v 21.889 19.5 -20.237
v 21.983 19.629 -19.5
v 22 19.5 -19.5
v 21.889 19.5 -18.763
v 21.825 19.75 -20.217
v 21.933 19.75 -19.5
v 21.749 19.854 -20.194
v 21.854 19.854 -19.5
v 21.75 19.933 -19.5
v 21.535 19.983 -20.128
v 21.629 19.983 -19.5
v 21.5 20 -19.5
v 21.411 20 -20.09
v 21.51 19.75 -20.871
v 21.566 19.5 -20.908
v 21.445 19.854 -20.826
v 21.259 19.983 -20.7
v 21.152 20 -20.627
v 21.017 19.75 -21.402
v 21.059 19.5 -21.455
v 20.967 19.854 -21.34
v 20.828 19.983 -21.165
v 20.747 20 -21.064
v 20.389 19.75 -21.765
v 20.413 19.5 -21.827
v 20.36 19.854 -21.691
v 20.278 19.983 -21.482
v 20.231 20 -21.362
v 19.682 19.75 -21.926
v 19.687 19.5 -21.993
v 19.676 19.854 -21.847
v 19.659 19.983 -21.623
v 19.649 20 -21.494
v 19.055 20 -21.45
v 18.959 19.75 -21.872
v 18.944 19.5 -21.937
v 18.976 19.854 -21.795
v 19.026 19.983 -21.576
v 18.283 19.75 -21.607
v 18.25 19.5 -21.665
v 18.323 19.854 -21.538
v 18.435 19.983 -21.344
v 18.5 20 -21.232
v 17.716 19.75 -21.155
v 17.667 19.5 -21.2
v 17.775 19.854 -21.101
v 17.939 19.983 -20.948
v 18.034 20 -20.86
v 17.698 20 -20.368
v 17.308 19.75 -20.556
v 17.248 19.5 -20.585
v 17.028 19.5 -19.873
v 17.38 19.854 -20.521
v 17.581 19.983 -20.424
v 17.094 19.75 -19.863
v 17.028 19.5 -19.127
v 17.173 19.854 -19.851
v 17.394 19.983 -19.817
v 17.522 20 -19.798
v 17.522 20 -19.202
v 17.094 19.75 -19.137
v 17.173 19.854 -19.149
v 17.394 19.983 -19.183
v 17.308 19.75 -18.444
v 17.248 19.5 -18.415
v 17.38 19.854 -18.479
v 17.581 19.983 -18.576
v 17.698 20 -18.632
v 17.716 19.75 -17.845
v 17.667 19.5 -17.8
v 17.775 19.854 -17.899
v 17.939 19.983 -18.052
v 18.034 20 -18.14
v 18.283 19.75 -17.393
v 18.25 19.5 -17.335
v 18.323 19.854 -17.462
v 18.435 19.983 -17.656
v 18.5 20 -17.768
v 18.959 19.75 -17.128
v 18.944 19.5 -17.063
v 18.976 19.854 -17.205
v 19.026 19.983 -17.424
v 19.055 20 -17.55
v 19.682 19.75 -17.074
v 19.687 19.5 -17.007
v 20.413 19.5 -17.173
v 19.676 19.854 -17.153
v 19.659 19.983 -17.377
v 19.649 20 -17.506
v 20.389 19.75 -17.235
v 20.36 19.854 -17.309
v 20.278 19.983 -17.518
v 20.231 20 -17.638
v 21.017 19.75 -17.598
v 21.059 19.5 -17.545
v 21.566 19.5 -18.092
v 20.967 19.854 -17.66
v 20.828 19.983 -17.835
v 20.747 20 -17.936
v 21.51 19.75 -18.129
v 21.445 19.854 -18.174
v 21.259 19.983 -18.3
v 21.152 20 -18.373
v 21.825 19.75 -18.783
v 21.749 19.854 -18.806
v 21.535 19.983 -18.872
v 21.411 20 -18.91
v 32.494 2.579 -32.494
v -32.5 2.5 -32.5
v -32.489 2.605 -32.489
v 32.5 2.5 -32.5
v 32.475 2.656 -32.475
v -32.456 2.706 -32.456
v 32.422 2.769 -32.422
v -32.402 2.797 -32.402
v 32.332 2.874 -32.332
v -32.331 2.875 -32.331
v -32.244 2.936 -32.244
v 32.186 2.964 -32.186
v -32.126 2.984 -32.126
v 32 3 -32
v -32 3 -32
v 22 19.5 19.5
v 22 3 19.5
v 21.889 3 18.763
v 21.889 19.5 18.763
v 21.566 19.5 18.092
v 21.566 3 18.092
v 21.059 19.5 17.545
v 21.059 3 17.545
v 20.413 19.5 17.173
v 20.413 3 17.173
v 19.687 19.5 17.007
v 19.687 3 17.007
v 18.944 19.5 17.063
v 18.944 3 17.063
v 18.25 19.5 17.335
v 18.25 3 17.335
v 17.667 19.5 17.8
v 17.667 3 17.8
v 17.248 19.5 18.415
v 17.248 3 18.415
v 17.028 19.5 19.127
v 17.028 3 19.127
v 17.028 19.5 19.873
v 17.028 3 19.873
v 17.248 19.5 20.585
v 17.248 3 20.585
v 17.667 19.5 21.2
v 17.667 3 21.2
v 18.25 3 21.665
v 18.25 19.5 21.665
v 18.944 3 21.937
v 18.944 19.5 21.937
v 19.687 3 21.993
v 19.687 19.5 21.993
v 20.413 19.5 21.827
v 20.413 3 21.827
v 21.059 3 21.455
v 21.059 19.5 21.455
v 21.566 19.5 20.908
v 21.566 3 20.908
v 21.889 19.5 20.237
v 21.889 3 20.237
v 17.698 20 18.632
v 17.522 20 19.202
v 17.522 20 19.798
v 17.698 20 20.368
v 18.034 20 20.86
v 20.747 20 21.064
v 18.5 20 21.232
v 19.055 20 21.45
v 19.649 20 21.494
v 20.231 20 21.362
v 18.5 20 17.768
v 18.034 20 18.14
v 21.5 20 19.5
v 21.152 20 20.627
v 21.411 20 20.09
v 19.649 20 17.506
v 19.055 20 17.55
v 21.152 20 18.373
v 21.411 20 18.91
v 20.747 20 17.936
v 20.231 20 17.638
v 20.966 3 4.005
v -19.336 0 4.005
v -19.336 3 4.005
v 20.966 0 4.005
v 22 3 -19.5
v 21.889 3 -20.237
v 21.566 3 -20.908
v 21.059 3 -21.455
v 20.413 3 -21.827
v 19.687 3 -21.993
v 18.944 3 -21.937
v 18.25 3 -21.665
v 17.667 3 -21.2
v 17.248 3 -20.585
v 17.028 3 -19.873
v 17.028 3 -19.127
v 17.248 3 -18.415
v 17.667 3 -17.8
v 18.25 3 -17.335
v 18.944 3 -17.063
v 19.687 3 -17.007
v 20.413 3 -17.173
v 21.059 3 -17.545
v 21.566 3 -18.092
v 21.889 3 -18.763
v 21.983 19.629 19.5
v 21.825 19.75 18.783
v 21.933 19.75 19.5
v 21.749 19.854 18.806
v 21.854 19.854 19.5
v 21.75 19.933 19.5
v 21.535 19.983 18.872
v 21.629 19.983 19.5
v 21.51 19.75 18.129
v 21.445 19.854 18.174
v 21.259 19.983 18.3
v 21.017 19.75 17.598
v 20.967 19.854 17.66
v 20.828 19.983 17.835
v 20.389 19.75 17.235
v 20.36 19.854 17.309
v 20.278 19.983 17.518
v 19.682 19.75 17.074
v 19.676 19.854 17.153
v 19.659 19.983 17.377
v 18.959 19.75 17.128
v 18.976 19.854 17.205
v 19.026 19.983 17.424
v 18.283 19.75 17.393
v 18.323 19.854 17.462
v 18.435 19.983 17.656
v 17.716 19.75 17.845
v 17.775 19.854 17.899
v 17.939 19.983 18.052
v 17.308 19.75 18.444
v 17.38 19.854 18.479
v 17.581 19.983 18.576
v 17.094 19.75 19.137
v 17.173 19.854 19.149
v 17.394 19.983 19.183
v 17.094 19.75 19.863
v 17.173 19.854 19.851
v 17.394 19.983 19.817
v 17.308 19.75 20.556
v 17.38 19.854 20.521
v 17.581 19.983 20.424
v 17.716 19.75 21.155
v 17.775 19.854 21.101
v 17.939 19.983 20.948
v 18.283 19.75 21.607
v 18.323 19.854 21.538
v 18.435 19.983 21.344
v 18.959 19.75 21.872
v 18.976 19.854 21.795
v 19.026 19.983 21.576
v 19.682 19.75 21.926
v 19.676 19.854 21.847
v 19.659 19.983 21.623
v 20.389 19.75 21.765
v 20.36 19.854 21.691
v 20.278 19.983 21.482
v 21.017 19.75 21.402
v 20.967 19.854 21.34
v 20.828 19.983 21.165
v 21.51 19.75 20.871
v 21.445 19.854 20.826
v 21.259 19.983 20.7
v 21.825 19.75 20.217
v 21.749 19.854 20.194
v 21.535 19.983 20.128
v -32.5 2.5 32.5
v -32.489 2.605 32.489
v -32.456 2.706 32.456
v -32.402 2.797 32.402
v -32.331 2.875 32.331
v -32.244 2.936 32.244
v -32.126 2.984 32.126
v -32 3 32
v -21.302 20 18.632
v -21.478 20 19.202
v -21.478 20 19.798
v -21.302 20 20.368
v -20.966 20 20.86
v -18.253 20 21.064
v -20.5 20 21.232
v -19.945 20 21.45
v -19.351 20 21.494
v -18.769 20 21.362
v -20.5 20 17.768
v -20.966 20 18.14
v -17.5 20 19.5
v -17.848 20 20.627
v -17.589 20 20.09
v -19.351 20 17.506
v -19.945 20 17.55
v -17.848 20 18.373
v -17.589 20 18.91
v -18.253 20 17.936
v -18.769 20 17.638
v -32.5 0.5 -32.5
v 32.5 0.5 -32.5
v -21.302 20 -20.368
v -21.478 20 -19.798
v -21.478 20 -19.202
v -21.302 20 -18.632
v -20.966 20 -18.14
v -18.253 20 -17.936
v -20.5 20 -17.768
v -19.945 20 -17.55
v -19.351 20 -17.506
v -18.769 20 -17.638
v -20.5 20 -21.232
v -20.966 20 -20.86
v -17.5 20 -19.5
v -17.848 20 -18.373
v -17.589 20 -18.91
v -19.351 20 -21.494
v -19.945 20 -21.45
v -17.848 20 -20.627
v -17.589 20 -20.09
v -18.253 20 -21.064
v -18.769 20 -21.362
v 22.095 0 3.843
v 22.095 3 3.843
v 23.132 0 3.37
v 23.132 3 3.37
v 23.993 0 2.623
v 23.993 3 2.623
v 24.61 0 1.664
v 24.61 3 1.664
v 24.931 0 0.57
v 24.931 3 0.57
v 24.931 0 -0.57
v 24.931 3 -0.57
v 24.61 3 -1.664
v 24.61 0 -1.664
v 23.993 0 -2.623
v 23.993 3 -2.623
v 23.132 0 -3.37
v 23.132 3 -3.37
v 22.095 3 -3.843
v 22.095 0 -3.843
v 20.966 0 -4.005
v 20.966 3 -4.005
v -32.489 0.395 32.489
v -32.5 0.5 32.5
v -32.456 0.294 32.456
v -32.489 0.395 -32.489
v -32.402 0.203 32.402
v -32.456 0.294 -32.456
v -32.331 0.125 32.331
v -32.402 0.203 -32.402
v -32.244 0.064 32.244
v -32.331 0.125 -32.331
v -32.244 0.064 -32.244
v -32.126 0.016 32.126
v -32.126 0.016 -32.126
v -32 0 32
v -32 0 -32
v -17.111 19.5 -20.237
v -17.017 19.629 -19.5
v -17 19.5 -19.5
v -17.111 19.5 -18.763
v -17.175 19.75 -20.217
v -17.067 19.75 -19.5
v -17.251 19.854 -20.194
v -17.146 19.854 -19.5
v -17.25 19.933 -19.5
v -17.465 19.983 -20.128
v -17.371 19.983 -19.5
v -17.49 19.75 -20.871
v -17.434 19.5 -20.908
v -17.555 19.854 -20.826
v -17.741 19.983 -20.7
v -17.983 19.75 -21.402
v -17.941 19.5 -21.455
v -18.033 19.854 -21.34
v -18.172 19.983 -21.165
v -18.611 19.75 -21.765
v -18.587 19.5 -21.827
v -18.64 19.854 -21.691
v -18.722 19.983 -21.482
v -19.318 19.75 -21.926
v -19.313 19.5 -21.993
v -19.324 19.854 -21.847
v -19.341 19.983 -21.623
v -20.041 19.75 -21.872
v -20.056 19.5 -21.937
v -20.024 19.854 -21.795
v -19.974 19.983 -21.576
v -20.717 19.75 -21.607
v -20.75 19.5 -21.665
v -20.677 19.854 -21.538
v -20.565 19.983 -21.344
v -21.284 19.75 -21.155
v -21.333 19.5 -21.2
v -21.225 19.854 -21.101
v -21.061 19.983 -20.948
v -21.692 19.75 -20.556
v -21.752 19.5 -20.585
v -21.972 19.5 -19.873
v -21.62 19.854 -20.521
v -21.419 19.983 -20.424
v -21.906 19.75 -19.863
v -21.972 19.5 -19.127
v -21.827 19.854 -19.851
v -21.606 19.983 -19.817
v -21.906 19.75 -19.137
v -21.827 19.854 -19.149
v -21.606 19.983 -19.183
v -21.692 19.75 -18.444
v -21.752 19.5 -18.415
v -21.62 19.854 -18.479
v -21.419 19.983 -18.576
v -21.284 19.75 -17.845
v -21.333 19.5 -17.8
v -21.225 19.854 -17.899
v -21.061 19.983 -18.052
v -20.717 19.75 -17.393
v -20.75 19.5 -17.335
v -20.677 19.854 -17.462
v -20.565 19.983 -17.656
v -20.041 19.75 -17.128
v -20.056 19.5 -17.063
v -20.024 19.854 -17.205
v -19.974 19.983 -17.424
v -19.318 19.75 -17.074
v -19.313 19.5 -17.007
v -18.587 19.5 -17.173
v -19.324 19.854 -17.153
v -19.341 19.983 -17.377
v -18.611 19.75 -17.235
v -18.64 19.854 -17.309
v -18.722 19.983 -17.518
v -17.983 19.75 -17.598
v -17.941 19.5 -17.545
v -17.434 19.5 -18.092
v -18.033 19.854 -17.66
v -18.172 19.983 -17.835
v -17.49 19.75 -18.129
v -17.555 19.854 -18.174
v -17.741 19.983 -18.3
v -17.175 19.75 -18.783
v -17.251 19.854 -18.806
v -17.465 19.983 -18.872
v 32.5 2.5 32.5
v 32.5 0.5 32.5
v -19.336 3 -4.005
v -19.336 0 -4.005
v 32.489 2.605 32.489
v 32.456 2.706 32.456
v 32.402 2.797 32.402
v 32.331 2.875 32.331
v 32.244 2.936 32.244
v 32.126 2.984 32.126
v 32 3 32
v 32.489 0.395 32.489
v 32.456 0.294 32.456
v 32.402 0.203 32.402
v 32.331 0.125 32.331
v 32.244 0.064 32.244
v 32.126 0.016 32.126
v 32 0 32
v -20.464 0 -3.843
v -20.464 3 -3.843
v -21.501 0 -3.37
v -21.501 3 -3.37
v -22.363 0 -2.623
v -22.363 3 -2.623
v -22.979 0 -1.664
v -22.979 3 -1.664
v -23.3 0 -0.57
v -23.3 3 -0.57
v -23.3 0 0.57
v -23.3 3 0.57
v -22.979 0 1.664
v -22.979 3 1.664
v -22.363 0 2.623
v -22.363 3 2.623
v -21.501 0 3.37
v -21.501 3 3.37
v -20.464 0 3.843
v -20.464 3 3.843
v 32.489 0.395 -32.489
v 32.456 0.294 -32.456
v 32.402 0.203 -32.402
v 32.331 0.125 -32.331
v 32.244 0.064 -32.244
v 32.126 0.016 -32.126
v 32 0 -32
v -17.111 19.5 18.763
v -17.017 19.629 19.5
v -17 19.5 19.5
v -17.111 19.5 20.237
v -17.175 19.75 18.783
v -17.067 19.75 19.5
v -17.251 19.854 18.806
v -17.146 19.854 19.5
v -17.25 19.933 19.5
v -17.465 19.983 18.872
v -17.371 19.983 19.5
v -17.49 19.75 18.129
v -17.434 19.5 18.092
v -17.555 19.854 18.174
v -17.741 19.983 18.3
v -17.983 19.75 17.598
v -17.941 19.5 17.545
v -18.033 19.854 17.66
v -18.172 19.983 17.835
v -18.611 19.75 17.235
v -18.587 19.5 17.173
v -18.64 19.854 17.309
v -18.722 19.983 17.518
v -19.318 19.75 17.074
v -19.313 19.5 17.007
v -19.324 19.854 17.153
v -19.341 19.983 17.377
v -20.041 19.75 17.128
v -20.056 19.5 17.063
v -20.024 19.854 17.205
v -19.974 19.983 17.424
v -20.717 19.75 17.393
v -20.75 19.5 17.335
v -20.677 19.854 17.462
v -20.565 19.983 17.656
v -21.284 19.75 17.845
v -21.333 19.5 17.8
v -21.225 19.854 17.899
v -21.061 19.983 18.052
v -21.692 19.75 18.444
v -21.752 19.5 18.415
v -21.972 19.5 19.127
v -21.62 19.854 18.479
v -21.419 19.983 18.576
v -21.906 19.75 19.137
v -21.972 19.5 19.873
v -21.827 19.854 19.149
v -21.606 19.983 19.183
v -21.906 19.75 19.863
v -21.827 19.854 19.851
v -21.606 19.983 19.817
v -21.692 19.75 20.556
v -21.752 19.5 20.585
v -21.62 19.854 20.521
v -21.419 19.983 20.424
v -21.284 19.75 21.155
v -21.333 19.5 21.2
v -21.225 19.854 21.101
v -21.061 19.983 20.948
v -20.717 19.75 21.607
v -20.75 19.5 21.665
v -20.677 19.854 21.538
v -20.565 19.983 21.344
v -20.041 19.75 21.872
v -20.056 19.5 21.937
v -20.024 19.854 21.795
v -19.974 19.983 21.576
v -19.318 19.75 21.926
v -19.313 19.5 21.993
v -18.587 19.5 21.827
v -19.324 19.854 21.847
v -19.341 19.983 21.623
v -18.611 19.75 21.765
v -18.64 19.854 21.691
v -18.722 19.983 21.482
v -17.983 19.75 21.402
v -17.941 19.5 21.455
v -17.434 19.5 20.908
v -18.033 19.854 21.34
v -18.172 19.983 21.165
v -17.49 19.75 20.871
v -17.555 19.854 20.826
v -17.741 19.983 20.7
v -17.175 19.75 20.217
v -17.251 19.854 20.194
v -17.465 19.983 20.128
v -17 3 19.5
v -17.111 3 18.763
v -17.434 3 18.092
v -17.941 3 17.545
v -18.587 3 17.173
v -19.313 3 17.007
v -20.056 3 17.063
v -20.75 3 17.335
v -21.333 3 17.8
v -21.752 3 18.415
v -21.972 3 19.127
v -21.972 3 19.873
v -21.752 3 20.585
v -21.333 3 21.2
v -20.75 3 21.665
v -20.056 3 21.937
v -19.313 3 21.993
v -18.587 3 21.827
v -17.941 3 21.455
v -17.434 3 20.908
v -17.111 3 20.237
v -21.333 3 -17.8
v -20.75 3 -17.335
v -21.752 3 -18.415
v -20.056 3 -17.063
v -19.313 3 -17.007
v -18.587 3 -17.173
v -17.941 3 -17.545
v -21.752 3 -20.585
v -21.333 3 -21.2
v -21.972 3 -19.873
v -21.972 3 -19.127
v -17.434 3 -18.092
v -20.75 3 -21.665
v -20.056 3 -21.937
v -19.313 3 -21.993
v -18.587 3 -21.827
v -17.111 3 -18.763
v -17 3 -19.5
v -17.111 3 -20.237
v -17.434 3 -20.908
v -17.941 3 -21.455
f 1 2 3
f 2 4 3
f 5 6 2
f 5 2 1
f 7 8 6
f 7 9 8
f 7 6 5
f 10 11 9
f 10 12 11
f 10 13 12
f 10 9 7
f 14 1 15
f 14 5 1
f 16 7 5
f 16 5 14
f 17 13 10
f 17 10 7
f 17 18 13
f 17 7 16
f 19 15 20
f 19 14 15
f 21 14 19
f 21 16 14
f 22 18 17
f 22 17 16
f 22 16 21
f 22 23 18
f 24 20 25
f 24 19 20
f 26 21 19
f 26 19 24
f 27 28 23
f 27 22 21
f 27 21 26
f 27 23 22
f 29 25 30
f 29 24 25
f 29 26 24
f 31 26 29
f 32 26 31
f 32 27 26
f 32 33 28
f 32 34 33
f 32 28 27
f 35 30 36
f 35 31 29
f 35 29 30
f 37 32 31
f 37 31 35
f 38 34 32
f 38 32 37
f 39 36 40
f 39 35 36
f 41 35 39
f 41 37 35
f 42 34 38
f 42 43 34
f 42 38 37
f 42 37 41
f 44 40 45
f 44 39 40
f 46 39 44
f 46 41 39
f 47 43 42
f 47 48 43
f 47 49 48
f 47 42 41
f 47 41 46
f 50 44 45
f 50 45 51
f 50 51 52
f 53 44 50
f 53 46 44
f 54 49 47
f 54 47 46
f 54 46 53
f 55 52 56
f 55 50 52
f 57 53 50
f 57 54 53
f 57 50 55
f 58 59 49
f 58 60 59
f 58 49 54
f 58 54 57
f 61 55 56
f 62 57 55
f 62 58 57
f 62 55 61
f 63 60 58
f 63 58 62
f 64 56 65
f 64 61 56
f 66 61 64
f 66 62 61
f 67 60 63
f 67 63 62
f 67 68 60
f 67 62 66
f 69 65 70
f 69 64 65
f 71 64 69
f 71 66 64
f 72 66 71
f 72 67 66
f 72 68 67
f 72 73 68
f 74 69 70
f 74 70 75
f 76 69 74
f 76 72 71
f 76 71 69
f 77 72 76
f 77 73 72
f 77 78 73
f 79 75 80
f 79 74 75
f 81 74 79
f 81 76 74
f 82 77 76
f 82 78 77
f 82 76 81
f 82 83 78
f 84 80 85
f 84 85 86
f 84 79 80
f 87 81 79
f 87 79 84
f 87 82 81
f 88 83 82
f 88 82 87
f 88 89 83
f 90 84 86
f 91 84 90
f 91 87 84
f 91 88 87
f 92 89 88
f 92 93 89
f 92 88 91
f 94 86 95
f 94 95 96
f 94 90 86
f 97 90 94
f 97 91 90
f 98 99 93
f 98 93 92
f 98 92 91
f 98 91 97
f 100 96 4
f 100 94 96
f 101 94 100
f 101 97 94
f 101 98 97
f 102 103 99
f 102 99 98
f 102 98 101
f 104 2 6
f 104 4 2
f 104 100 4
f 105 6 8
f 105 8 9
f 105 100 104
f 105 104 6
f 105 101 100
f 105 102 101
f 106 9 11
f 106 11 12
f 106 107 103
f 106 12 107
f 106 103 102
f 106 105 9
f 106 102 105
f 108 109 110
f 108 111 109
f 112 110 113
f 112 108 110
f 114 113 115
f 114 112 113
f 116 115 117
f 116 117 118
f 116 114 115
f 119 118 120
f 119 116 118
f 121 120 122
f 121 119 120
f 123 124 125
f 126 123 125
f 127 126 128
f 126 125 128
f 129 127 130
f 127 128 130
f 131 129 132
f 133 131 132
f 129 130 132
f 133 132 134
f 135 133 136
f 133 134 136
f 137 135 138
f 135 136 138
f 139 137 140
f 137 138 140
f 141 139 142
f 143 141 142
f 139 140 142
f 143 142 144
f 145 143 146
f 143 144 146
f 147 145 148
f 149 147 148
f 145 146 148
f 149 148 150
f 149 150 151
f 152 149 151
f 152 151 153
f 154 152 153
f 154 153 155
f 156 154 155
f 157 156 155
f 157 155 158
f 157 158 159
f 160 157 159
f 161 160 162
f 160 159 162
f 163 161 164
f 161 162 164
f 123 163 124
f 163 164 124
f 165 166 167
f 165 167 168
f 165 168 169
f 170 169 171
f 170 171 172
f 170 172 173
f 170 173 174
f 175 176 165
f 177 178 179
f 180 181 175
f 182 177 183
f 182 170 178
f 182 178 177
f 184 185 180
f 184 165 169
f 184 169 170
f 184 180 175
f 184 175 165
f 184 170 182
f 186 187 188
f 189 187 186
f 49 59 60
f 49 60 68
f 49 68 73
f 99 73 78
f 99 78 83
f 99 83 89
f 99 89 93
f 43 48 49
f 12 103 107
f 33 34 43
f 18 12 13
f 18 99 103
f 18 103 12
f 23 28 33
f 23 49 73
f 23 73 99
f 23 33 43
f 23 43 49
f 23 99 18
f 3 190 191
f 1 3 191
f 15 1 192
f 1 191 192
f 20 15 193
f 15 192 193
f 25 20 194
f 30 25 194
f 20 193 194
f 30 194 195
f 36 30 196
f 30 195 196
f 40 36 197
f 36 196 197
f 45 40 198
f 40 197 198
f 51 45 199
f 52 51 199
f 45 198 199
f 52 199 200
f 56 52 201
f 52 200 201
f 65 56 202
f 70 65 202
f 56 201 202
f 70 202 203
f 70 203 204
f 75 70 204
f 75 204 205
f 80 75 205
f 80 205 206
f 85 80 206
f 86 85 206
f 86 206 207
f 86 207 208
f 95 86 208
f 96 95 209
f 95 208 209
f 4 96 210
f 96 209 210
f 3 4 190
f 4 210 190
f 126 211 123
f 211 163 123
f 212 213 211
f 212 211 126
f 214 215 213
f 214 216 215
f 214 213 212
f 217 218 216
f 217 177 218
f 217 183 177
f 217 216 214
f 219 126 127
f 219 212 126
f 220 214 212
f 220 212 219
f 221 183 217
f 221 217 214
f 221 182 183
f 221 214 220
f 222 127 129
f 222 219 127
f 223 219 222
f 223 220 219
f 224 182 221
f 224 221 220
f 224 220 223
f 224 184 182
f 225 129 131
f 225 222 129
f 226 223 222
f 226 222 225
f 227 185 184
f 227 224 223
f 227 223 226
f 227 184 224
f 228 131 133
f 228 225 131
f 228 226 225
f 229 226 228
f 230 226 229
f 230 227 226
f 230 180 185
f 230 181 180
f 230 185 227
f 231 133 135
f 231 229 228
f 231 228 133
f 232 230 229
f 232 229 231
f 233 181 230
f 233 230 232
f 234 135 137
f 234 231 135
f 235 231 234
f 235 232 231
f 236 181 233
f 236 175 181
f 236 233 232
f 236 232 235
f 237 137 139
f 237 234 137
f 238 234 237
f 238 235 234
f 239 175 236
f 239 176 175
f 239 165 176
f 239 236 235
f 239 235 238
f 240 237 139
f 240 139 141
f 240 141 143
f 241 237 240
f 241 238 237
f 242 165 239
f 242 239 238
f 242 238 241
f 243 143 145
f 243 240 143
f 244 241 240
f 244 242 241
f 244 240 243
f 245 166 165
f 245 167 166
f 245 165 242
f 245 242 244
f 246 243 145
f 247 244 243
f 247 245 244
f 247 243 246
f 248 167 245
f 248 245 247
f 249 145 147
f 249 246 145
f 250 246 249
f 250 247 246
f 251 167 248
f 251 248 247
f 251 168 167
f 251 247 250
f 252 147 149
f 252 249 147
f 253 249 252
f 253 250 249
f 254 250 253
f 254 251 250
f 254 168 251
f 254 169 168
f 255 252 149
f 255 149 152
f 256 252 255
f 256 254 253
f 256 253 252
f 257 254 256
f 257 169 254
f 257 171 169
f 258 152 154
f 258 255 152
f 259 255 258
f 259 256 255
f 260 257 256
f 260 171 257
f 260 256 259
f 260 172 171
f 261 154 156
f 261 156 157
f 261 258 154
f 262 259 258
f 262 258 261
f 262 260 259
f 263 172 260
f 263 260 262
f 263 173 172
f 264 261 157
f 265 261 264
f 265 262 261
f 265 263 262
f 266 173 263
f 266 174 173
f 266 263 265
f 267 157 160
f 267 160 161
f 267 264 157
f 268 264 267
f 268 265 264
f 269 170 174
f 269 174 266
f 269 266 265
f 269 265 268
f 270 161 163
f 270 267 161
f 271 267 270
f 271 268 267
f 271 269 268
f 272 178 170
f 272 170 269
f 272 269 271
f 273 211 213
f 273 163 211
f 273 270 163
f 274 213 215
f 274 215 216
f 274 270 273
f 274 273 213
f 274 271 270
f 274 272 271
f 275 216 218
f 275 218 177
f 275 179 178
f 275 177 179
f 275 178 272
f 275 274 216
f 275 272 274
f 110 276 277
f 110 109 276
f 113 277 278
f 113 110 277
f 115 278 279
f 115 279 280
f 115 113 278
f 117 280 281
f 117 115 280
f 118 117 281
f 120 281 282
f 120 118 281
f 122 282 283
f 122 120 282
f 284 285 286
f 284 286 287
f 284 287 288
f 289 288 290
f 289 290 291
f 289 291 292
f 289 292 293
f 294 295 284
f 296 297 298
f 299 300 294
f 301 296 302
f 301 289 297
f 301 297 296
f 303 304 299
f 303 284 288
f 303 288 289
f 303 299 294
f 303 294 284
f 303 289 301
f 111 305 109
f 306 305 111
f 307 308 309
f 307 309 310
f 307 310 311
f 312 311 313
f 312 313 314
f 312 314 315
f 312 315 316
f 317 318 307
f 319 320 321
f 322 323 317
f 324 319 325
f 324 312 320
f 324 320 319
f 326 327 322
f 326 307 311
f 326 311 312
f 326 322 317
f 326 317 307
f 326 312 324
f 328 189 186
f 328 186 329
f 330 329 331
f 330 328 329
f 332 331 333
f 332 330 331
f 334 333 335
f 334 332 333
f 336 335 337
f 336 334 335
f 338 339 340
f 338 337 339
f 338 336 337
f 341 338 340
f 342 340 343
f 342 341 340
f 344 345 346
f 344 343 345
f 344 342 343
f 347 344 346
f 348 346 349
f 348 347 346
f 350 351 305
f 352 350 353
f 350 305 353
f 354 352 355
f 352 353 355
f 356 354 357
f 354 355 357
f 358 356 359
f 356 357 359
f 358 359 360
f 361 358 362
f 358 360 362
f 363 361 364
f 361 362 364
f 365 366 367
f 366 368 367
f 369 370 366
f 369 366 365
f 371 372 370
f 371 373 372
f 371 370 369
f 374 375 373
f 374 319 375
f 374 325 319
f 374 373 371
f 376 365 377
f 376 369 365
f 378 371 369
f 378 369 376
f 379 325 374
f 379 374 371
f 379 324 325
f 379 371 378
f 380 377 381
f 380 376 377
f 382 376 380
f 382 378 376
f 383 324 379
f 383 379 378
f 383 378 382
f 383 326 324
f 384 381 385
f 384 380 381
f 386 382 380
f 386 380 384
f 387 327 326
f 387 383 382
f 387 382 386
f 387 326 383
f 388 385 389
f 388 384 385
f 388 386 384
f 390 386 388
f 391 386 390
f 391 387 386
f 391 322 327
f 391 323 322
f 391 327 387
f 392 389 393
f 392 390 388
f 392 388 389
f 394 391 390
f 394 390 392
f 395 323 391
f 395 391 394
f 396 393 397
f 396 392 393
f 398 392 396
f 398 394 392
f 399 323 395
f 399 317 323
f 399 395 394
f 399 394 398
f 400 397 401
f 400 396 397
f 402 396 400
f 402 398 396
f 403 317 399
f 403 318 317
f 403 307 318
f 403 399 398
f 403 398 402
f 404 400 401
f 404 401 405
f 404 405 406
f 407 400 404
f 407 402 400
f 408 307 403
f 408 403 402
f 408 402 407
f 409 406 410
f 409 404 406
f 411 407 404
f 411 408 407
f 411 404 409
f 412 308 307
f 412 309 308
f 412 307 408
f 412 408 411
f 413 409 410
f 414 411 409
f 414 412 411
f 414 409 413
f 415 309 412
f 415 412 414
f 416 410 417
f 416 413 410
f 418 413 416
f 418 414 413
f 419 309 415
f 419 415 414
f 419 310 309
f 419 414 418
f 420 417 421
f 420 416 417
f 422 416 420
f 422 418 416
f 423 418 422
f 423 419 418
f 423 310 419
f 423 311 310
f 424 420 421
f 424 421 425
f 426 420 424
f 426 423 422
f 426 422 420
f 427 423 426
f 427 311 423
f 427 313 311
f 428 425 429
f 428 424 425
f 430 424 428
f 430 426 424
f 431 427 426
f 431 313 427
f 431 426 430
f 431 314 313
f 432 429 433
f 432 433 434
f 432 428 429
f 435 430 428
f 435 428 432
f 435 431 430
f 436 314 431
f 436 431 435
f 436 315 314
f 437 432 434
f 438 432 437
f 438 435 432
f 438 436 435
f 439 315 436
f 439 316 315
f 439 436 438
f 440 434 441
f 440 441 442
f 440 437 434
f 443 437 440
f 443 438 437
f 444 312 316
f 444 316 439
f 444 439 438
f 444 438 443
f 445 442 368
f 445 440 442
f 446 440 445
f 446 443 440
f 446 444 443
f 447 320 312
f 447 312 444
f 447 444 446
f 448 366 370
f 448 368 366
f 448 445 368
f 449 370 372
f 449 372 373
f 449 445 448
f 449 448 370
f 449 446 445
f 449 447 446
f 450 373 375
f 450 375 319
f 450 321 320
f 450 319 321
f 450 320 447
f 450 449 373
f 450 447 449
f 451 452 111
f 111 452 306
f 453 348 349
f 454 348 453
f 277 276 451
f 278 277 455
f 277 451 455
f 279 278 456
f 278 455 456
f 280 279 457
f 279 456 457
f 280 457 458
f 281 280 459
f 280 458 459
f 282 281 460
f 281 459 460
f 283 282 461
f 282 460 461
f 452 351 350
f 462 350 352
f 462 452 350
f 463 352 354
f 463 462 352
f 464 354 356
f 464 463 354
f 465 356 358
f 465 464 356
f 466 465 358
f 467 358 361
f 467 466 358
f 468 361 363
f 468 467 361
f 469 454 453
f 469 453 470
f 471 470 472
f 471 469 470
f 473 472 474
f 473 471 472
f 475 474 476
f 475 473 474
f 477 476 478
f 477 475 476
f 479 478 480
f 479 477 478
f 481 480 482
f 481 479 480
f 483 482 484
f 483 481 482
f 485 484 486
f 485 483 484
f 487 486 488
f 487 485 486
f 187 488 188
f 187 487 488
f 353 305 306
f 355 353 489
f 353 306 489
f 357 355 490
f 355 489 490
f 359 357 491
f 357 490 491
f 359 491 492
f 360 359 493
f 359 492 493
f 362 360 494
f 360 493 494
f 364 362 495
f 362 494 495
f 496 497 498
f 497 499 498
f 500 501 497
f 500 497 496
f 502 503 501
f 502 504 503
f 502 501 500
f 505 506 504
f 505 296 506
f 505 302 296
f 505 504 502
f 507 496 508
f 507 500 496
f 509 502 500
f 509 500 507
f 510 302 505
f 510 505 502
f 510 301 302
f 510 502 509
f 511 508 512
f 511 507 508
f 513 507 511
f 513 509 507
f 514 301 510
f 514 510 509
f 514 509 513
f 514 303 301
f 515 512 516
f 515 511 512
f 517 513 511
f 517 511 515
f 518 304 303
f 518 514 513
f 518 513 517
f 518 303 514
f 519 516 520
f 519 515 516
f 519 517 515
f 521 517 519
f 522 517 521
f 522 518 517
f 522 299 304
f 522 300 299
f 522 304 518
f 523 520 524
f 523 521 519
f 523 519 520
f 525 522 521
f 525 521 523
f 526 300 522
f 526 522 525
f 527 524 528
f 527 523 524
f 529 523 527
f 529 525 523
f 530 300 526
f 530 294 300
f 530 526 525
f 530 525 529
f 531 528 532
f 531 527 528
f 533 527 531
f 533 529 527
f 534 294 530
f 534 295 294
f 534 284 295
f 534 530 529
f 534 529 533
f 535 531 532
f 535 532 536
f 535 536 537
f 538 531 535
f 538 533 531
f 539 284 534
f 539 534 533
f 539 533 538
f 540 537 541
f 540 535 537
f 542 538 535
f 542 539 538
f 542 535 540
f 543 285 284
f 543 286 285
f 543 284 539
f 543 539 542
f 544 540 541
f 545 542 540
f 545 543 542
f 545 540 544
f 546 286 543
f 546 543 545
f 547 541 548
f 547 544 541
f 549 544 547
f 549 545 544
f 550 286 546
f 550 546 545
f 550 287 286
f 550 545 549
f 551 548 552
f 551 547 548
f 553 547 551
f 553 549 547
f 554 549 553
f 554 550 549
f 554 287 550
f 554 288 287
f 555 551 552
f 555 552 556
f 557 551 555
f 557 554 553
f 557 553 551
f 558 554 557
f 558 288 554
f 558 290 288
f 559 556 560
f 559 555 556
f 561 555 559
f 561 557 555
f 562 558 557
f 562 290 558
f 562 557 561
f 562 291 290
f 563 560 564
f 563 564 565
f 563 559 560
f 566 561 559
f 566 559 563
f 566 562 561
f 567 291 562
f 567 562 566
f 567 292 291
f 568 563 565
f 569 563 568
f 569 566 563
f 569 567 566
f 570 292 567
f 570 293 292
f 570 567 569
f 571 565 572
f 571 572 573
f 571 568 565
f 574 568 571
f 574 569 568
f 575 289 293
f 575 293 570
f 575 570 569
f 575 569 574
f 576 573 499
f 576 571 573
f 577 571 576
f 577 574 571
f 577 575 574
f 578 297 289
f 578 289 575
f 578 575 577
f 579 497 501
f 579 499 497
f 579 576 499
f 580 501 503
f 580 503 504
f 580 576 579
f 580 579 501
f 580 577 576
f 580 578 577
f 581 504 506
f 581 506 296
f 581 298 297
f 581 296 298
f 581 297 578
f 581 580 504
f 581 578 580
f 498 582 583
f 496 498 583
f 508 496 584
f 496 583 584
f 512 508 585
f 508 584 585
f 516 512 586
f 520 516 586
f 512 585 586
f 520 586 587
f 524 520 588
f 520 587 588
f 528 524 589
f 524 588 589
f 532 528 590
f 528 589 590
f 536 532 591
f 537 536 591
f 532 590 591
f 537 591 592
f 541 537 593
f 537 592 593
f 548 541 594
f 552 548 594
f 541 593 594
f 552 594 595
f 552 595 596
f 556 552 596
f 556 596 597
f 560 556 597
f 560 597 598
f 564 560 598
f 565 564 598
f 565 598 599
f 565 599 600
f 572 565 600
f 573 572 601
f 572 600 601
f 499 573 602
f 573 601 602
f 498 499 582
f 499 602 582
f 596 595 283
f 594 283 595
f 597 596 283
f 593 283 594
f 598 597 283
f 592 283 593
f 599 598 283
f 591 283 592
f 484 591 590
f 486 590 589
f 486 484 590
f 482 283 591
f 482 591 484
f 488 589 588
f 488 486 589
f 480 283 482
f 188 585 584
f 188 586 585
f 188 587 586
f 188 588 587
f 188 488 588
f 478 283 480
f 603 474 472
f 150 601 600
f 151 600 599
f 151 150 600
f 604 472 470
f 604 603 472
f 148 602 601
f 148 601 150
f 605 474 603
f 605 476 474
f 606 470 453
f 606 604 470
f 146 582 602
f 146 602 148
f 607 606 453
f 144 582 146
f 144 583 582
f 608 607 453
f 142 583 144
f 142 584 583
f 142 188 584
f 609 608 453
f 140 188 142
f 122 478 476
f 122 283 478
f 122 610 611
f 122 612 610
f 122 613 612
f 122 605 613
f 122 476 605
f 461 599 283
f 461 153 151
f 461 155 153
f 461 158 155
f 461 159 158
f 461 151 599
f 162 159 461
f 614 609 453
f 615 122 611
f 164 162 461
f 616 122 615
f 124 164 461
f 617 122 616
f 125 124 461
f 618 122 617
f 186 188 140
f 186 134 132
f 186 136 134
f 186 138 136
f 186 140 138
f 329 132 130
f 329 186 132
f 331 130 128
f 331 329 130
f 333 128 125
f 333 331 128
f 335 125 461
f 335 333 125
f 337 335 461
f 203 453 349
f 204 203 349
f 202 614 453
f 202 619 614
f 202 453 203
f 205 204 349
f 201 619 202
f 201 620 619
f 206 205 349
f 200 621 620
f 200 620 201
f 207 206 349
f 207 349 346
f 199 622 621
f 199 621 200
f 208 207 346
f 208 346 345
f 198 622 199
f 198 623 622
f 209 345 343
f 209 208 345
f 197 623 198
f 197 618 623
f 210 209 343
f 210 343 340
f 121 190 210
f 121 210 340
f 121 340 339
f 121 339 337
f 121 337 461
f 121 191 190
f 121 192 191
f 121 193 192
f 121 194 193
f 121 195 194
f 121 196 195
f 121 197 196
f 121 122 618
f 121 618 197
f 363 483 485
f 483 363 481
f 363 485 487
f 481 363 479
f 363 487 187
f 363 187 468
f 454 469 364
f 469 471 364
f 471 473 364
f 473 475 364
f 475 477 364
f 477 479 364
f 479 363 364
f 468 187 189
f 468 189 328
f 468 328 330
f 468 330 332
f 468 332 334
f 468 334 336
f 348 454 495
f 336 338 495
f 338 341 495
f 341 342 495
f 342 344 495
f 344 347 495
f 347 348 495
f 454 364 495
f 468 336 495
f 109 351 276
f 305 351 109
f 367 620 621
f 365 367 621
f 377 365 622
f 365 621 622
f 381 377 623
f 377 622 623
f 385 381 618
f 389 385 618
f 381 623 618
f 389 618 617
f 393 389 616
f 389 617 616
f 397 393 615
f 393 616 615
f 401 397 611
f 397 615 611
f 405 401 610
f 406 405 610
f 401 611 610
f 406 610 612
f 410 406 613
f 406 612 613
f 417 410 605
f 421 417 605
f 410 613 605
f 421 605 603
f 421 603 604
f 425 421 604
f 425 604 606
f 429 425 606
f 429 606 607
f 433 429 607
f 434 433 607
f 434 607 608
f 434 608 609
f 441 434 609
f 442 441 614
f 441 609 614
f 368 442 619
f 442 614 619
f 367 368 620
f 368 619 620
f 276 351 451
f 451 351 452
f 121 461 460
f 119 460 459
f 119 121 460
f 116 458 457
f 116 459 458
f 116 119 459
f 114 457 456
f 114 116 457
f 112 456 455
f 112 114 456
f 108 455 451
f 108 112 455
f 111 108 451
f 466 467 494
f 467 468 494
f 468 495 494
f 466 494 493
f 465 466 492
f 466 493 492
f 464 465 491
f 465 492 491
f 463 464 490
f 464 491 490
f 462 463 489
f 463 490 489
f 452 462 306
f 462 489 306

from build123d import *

# Parameters (mm, degrees)
SKETCH1_W           = 65
SKETCH1_H           = 65
BOSS_EXTRUDE1_DEPTH = 3
SKETCH2_R           = 2.5
BOSS_EXTRUDE2_DEPTH = 17
CUT_EXTRUDE1_DEPTH  = 21
FILLET1_R           = 0.5


with BuildPart() as part:
    # Sketch1 → Boss-Extrude1 (new body)
    with BuildSketch(Plane(origin=(0, 0, 0), x_dir=(1, 0, 0), z_dir=(0, 1, 0))):
        Rectangle(SKETCH1_W, SKETCH1_H)
    extrude(amount=BOSS_EXTRUDE1_DEPTH)

    # Sketch2 → Boss-Extrude2 (add)
    with BuildSketch(Plane(origin=(0, 3, 0), x_dir=(1, 0, 0), z_dir=(0, 1, 0))):
        with Locations((-19.5, 19.5)):
            Circle(SKETCH2_R)
        with Locations((19.5, 19.5)):
            Circle(SKETCH2_R)
        with Locations((-19.5, -19.5)):
            Circle(SKETCH2_R)
        with Locations((19.5, -19.5)):
            Circle(SKETCH2_R)
    extrude(amount=BOSS_EXTRUDE2_DEPTH)

    # Sketch3 → Cut-Extrude1 (cut, through all)
    with BuildSketch(Plane.XZ):
        with BuildLine():
            Line((-19.335806009, 4.005402362), (20.966240956, 4.005402362))
            ThreePointArc((20.966240956, 4.005402362), (24.971643318, 0), (20.966240956, -4.005402362))
            Line((20.966240956, -4.005402362), (-19.335806009, -4.005402362))
            ThreePointArc((-19.335806009, -4.005402362), (-23.34120837, 0), (-19.335806009, 4.005402362))
        make_face()
    extrude(amount=-CUT_EXTRUDE1_DEPTH, mode=Mode.SUBTRACT)

    # Fillet1
    fillet1_edges = [part.edges().sort_by_distance(p)[0] for p in [
        (-32.5, 3, 0),
        (-22, 20, -19.5),
        (0, 3, 32.5),
        (17, 20, -19.5),
        (-22, 20, 19.5),
        (17, 20, 19.5),
        (32.5, 3, 0),
        (0, 0, 32.5),
        (-32.5, 0, 0),
        (0, 0, -32.5),
        (32.5, 0, 0),
        (0, 3, -32.5),
    ]]
    fillet(fillet1_edges, radius=FILLET1_R)


solid = part.part
